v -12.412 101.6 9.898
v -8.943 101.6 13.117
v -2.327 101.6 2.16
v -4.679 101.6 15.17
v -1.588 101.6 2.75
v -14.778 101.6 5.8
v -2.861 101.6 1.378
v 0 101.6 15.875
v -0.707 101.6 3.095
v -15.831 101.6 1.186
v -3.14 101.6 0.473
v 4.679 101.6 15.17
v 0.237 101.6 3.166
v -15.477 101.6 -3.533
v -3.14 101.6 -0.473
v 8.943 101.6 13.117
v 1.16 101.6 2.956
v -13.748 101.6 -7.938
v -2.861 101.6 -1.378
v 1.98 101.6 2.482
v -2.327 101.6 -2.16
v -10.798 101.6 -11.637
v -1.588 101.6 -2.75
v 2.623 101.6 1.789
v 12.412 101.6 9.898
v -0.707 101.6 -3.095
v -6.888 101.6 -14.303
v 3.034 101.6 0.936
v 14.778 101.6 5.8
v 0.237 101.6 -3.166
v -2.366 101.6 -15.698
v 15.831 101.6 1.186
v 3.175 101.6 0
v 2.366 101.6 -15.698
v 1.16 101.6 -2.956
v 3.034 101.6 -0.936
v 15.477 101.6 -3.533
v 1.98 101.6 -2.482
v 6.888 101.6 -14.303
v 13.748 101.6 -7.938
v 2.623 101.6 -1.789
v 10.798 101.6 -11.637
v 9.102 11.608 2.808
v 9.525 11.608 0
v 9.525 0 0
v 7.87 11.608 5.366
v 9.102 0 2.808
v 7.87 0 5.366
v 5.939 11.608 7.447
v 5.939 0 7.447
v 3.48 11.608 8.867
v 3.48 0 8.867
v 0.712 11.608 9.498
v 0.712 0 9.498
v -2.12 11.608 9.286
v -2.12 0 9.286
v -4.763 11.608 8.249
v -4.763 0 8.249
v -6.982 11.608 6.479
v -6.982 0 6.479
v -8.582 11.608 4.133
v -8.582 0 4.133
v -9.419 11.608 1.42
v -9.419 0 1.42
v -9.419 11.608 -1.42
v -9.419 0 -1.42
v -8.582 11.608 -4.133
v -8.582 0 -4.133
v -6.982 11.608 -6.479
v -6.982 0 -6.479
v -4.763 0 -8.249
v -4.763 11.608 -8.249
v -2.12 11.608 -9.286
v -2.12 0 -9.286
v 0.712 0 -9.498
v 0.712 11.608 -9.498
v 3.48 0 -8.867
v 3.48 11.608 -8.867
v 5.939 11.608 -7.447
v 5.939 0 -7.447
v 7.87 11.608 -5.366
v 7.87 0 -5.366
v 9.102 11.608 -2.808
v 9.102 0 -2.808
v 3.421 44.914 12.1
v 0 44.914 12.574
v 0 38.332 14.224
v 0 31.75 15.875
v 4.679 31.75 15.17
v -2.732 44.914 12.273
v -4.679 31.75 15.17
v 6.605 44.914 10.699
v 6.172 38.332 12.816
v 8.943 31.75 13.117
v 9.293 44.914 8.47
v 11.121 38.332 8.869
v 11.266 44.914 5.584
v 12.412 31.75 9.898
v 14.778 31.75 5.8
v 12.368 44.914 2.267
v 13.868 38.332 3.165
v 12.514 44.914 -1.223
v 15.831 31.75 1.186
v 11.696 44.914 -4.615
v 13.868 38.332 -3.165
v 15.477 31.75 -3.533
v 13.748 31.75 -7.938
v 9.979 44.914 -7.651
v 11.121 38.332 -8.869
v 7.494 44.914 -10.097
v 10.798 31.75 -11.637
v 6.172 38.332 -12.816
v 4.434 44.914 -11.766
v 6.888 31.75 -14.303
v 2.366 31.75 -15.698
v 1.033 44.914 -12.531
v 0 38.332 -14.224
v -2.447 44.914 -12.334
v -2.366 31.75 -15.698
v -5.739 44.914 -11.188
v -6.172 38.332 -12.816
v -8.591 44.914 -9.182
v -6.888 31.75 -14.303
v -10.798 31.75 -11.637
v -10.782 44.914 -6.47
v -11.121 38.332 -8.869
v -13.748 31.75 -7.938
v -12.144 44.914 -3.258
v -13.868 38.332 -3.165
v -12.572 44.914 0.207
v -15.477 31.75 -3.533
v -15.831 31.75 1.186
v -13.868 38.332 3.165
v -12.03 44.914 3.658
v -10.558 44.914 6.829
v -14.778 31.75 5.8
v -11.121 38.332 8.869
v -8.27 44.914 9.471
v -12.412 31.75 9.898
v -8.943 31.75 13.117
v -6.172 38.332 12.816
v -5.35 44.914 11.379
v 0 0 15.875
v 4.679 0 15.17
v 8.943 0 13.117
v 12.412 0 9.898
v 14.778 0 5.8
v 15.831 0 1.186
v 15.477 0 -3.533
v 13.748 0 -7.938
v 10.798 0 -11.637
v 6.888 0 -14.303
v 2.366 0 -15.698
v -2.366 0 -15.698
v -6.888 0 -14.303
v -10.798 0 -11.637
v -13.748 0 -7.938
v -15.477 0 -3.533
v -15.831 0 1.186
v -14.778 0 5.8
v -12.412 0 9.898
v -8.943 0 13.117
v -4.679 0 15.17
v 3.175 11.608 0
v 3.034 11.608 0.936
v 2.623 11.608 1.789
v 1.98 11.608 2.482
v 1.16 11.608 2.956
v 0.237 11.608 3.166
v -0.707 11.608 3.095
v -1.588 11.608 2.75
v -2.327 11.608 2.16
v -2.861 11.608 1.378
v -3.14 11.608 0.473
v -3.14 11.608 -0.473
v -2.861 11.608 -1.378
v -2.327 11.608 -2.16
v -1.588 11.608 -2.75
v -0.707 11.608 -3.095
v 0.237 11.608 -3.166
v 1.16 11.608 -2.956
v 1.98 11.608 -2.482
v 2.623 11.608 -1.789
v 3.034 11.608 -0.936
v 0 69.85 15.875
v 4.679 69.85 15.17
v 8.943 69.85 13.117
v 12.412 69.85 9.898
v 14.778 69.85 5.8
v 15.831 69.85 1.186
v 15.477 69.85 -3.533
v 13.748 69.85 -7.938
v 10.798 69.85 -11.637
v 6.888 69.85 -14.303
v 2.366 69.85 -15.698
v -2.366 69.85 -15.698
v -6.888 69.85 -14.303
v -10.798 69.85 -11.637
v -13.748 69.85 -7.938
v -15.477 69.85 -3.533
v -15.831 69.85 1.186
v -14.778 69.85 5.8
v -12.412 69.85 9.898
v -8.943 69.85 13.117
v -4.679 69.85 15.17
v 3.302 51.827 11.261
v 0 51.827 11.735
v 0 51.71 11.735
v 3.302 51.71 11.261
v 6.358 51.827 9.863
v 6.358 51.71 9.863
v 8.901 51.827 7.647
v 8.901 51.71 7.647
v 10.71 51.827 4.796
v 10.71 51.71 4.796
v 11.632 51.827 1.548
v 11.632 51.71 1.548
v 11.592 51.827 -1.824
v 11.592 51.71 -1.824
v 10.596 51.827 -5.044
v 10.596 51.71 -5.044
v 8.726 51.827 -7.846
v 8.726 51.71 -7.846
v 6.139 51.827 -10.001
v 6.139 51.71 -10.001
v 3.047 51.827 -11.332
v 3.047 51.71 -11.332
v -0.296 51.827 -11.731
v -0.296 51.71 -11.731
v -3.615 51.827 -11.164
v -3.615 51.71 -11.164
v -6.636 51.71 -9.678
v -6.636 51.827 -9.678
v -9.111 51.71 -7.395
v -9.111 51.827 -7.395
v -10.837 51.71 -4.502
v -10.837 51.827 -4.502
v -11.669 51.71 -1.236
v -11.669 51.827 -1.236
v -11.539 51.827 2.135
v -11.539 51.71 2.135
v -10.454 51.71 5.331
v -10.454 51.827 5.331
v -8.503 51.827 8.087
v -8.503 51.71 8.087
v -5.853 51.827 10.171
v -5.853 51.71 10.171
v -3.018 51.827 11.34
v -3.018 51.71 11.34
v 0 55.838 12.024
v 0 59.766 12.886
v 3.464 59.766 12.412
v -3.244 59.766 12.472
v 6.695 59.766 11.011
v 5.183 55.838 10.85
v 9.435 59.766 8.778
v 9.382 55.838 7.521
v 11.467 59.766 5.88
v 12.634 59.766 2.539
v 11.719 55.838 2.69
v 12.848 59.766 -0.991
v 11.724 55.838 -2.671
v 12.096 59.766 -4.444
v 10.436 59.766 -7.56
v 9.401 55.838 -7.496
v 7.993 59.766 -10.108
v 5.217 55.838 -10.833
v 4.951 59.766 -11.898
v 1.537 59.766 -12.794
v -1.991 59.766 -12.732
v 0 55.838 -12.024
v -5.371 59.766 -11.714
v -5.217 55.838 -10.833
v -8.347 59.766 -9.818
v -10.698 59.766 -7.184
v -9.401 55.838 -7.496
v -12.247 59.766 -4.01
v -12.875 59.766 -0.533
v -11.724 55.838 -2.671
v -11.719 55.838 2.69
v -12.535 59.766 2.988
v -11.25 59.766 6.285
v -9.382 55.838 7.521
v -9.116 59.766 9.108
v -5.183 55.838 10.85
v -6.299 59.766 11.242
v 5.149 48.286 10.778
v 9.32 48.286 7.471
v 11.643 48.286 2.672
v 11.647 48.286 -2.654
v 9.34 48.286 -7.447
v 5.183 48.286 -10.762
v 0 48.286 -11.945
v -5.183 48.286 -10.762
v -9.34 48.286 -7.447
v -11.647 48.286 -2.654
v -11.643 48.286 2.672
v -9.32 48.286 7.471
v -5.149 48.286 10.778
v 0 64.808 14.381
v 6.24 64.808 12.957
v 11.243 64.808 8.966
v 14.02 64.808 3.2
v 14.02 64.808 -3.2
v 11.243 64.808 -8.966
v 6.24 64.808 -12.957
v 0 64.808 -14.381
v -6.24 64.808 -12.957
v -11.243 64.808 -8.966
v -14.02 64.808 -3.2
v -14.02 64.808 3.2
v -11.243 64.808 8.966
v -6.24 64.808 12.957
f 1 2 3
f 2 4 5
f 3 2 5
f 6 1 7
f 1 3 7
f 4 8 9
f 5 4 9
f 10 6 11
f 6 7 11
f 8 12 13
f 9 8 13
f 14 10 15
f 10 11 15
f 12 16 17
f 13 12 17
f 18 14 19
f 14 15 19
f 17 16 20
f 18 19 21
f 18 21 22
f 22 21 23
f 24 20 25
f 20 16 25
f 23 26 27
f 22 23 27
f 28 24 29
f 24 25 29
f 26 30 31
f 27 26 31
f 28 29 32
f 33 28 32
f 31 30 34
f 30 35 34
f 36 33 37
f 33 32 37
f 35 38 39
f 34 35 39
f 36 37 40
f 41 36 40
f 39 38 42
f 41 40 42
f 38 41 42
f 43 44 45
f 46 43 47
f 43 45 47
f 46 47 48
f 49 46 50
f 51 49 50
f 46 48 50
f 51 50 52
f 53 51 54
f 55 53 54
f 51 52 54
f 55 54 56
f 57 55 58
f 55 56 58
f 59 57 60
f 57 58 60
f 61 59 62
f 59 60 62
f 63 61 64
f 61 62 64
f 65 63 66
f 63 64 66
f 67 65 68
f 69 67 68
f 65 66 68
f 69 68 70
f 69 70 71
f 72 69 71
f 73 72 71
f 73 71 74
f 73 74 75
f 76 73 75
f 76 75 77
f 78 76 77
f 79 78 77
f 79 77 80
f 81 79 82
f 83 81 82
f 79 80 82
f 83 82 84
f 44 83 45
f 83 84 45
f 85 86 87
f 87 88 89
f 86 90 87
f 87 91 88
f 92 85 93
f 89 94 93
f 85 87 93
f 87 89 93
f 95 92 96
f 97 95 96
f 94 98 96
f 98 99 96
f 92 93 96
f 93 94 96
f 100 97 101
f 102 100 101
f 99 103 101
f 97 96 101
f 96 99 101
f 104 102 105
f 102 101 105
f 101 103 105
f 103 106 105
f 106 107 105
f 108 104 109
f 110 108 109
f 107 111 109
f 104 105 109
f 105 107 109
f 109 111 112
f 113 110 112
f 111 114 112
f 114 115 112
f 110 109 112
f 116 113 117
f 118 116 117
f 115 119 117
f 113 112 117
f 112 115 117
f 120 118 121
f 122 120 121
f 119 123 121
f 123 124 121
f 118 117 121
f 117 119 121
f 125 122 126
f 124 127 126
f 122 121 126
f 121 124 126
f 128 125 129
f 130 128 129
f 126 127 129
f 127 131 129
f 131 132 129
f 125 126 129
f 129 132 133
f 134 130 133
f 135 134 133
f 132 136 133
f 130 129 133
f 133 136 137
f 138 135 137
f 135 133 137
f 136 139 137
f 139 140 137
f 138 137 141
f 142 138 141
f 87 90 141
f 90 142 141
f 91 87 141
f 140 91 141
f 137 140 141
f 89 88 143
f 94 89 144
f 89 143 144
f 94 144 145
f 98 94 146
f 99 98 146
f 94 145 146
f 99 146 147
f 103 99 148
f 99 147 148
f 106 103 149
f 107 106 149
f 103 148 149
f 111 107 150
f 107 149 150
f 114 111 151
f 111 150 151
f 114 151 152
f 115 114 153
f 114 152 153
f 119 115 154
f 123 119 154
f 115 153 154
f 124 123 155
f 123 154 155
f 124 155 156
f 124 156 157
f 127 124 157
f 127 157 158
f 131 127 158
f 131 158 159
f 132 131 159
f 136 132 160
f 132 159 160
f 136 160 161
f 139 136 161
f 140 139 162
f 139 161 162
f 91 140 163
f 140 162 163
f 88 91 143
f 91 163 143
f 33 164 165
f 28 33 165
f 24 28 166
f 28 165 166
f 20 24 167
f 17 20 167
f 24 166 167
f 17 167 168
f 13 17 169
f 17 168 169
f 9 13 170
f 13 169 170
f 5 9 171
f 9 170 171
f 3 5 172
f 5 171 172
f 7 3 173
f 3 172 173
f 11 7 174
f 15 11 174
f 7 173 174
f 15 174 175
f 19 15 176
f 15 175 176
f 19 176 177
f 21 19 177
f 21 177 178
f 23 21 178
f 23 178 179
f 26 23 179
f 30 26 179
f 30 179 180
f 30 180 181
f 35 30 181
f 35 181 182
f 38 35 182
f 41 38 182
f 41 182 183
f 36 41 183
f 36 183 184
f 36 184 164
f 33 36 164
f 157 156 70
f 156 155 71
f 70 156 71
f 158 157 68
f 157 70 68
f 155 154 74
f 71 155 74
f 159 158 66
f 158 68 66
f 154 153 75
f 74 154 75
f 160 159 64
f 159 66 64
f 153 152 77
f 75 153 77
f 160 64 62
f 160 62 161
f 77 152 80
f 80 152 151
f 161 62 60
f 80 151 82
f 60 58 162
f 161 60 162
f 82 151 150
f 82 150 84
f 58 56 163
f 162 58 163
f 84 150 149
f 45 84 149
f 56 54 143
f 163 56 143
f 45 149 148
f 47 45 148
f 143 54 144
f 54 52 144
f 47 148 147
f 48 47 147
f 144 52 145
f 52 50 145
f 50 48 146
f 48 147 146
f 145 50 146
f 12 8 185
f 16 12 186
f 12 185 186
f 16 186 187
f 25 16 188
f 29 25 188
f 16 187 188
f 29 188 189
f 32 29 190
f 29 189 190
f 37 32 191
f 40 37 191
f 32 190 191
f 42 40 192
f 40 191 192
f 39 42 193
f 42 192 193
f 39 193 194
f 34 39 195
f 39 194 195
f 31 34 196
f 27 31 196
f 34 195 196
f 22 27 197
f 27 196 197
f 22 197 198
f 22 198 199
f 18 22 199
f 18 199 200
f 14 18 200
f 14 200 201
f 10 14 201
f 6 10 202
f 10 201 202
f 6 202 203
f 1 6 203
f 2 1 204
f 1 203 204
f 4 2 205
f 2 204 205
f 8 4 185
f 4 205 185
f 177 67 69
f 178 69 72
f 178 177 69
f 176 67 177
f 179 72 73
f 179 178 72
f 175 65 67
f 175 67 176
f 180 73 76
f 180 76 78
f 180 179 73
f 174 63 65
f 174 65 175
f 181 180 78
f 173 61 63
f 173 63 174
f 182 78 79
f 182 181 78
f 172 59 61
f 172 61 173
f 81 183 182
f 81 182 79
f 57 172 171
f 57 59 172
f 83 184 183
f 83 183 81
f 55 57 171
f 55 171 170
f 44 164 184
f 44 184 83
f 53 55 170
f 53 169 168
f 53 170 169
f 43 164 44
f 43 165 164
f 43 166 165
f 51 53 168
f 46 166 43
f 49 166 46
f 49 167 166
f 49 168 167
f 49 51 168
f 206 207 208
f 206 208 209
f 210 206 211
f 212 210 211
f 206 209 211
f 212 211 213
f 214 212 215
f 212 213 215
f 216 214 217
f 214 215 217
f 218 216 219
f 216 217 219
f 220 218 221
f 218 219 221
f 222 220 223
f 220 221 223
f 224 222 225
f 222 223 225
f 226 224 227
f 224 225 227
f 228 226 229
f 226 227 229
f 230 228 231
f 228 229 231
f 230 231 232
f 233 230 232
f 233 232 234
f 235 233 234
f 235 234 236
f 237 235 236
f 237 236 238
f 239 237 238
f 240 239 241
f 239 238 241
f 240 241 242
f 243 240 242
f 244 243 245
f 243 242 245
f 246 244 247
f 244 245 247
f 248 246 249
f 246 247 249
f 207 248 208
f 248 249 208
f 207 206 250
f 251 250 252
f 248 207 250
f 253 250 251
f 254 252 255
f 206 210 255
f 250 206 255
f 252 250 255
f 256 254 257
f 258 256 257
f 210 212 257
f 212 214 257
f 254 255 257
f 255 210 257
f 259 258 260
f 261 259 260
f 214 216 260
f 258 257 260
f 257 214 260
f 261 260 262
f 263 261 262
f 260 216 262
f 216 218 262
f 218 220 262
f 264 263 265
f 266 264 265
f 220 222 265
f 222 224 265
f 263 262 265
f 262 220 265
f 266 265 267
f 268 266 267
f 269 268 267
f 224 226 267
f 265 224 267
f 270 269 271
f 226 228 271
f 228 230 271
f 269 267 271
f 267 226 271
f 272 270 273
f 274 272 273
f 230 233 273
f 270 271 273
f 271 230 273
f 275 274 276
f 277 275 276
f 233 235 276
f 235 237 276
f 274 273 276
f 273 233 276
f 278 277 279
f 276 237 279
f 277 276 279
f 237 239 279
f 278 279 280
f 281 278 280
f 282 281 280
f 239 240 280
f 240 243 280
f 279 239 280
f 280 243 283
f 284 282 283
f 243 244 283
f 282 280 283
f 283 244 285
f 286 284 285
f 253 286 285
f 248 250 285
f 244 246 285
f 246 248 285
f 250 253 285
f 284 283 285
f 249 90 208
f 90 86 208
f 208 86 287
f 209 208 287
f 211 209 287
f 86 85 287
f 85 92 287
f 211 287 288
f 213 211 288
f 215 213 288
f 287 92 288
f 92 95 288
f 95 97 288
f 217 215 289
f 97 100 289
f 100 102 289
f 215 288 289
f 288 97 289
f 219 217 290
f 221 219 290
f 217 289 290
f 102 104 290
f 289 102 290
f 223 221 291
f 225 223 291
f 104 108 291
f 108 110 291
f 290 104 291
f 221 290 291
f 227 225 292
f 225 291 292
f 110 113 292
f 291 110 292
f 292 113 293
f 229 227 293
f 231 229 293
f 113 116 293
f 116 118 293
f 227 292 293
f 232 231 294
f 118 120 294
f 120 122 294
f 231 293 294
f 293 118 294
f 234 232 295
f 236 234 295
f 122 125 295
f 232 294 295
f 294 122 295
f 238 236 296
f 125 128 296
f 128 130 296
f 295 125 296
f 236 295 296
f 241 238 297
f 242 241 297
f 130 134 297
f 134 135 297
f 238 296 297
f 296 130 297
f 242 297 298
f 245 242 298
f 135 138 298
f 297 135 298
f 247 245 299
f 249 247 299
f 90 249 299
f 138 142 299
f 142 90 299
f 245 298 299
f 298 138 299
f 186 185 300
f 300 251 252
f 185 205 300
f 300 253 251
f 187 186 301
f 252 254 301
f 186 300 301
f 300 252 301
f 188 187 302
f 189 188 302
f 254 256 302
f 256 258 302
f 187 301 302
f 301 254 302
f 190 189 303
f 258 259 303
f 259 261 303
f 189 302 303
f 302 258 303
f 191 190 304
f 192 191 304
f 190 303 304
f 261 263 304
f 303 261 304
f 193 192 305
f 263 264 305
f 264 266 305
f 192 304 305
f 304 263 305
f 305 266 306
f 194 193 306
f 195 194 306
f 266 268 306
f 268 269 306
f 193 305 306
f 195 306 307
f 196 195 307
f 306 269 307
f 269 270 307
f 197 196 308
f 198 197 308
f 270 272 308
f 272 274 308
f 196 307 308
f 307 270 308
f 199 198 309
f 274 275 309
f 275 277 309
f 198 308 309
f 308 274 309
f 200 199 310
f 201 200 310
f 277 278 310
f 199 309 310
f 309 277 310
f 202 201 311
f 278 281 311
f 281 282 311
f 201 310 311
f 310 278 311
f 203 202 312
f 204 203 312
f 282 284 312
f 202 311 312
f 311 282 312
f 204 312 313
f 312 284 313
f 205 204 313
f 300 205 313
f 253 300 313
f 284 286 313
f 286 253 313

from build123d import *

# Parameters (mm, degrees)
F2_R     = 9.525
F3_DEPTH = 11.6078
F5_D     = 6.35
F6_R     = 27.94


with BuildPart() as f1:
    # F0 (on Right) → F1 (revolve)
    with BuildSketch(Plane.YZ):
        Polygon((0, 15.875), (0, 0), (101.6, 0), (101.6, 15.875), (69.85, 15.875), (55.88, 11.7348), (48.26, 11.7348), (31.75, 15.875), align=None)
    revolve(axis=Axis((0, 35.272012, 0), (0, 1, 0)))

    # F2 (on face) → F3 (cut)
    with BuildSketch(Plane.XZ):
        Circle(F2_R)
    extrude(amount=-F3_DEPTH, mode=Mode.SUBTRACT)

    # F5 (through all)
    with Locations(Plane(origin=(0, 101.6, 0), x_dir=(-1, 0, 0), z_dir=(0, 1, 0))):
        with Locations((0, 0)):
            Hole(F5_D / 2)

    # F6
    f6_edges = [f1.edges().sort_by_distance(p)[0] for p in [
        (0, 48.26, -11.7348),
        (0, 55.88, -11.7348),
    ]]
    fillet(f6_edges, radius=F6_R)


solid = f1.part
